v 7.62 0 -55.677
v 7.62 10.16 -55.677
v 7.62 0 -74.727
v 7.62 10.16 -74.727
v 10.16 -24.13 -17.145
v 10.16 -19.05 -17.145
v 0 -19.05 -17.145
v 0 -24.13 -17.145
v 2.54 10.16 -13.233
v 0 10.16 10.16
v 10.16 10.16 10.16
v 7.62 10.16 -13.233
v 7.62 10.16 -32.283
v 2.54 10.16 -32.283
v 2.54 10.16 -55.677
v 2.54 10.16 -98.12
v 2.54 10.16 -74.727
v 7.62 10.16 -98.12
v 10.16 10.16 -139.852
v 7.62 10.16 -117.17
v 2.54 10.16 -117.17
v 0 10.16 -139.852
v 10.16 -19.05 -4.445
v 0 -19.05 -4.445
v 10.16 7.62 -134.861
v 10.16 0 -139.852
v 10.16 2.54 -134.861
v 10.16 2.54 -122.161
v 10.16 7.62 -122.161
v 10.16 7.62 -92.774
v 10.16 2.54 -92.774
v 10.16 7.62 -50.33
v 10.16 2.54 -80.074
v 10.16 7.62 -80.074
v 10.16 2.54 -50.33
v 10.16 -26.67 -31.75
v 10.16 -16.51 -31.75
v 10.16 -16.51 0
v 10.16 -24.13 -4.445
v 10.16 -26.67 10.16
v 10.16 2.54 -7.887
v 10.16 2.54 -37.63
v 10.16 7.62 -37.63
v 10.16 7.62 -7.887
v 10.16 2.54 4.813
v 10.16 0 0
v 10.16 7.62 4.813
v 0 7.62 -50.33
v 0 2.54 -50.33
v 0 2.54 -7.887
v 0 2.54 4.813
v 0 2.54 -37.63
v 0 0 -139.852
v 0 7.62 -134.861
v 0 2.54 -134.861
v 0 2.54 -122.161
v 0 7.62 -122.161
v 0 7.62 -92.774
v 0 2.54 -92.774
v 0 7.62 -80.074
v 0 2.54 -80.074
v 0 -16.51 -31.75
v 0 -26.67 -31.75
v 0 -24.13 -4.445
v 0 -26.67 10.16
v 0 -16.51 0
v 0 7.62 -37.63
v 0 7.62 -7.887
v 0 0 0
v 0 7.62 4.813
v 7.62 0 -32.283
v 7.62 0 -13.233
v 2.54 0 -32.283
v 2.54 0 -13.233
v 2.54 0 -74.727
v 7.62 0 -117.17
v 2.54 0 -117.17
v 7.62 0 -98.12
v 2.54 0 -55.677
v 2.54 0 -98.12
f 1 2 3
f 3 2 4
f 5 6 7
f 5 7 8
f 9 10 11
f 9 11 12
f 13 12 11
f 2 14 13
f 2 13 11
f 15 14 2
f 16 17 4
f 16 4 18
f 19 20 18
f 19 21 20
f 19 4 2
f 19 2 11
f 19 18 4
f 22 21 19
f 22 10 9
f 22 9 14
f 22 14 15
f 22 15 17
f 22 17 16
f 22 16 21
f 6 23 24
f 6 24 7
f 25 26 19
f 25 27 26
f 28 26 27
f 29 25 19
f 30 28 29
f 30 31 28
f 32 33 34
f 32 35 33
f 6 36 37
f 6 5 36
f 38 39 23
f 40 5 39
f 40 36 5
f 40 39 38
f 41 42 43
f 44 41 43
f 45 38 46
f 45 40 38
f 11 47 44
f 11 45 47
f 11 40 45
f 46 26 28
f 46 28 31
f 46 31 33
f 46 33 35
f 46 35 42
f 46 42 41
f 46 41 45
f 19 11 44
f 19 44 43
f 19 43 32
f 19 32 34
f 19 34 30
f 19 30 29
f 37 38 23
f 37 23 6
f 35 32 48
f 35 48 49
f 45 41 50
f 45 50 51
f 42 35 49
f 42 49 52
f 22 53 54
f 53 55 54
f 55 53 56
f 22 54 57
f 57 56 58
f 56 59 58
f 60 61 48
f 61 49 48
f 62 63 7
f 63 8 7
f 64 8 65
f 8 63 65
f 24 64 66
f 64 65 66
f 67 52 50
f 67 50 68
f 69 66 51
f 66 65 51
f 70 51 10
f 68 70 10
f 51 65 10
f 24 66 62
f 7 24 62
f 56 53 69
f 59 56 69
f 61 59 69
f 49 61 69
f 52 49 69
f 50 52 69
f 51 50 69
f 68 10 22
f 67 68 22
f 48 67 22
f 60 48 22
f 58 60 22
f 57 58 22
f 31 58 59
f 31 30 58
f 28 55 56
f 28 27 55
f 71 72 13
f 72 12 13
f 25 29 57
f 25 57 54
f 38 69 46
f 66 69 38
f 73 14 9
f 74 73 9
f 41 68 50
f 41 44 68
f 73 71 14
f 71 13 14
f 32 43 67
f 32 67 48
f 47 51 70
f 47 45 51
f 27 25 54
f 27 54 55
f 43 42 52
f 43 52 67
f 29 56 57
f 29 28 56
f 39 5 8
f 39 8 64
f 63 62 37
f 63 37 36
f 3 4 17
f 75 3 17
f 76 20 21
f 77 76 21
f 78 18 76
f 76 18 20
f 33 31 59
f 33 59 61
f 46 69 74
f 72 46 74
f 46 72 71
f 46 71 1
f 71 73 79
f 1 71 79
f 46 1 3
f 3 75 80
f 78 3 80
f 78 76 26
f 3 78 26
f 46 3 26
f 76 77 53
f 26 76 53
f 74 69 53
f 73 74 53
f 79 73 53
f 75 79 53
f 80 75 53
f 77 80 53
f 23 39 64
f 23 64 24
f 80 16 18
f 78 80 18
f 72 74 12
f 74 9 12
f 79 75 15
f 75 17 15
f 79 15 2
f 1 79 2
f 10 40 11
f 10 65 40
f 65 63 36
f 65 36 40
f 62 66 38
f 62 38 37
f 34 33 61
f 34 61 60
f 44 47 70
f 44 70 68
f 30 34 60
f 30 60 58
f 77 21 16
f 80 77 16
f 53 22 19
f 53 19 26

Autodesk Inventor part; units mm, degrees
ref_plane "YZ Plane" through (0, 0, 0) normal (1, 0, 0) x (0, 1, 0)
ref_plane "XZ Plane" through (0, 0, 0) normal (0, 1, 0) x (-1, 0, 0)
ref_plane "XY Plane" through (0, 0, 0) normal (0, 0, 1) x (1, 0, 0)
sketch "Sketch1" plane through (0, 0, 0) normal (1, 0, 0) x (0, 1, 0)
  line L0 (0, 0) -> (0, -139.8524)
  line L1 (0, 0) -> (-16.51, 0)
  line L2 (-16.51, 0) -> (-16.51, -31.75)
  line L3 (-16.51, -31.75) -> (-26.67, -31.75)
  line L4 (-26.67, -31.75) -> (-26.67, 10.16)
  line L5 (-26.67, 10.16) -> (10.16, 10.16)
  line L6 (10.16, 10.16) -> (10.16, -139.8524)
  line L7 (10.16, -139.8524) -> (0, -139.8524)
  dimension "d1" = 10.16
  dimension "d2" = 10.16
  dimension "d3" = 16.51
  dimension "d4" = 31.75
  dimension "d5" = 10.16
  dimension "d17" = 150.0124
extrude "Extrusion1" add sketch "Sketch1" along normal blind 10.16
sketch "Sketch2" plane through (0, 10.16, 10.16) normal (0, 1, 0) x (1, 0, 0)
  line L0 (2.54, 23.3934) -> (7.62, 23.3934)
  line L1 (7.62, 23.3934) -> (7.62, 42.4434)
  line L2 (7.62, 42.4434) -> (2.54, 42.4434)
  line L3 (2.54, 42.4434) -> (2.54, 23.3934)
  line L4 (0, 0) -> (10.16, 0) projected
  line L5 (0, 150.0124) -> (0, 0) projected
  line L6 (10.16, 150.0124) -> (10.16, 0) projected
  line L7 (2.54, 65.8368) -> (7.62, 65.8368)
  line L8 (7.62, 65.8368) -> (7.62, 84.8868)
  line L9 (7.62, 84.8868) -> (2.54, 84.8868)
  line L10 (2.54, 84.8868) -> (2.54, 65.8368)
  line L11 (2.54, 108.2802) -> (7.62, 108.2802)
  line L12 (7.62, 108.2802) -> (7.62, 127.3302)
  line L13 (7.62, 127.3302) -> (2.54, 127.3302)
  line L14 (2.54, 127.3302) -> (2.54, 108.2802)
  line L15 (0, 150.0124) -> (10.16, 150.0124) projected
  point P0 (0, 10.16)
  dimension "d8" = 23.3934
  dimension "d9" = 19.05
  dimension "d10" = 5.08
  dimension "d11" = 2.54
  dimension "d12" = 2.54
  dimension "d13" = 19.05
  dimension "d14" = 23.3934
  dimension "d15" = 19.05
  dimension "d16" = 23.3934
  dimension "d18" = 22.6822
  dimension "d19" = 5.08
  dimension "d20" = 5.08
  dimension "d21" = 2.54
  dimension "d22" = 2.54
  dimension "d23" = 2.54
  dimension "d24" = 2.54
extrude "Extrusion2" cut sketch "Sketch2" against normal blind 10.16 contours L3 L2 L1 L0 | L10 L9 L8 L7 | L14 L13 L12 L11
sketch "Sketch3" plane through (10.16, 0, 0) normal (1, 0, 0) x (0, 0, -1)
  line L0 (17.145, -24.13) -> (4.445, -24.13)
  line L1 (4.445, -24.13) -> (4.445, -19.05)
  line L2 (4.445, -19.05) -> (17.145, -19.05)
  line L3 (17.145, -19.05) -> (17.145, -24.13)
  line L4 (31.75, -16.51) -> (0, -16.51) projected
  line L5 (-10.16, -26.67) -> (31.75, -26.67) projected
  line L6 (-10.16, 10.16) -> (-10.16, -26.67) projected
  line L7 (31.75, -26.67) -> (31.75, -16.51) projected
  line L8 (-4.8133, 7.62) -> (7.8867, 7.62)
  line L9 (7.8867, 7.62) -> (7.8867, 2.54)
  line L10 (7.8867, 2.54) -> (-4.8133, 2.54)
  line L11 (-4.8133, 2.54) -> (-4.8133, 7.62)
  line L12 (139.8524, 10.16) -> (-10.16, 10.16) projected
  line L13 (0, 0) -> (139.8524, 0) projected
  line L14 (134.8613, 2.54) -> (122.1613, 2.54)
  line L15 (122.1613, 2.54) -> (122.1613, 7.62)
  line L16 (122.1613, 7.62) -> (134.8613, 7.62)
  line L17 (134.8613, 7.62) -> (134.8613, 2.54)
  line L18 (139.8524, 0) -> (139.8524, 10.16) projected
  line L19 (80.0735, 7.62) -> (92.7735, 7.62)
  line L20 (92.7735, 7.62) -> (92.7735, 2.54)
  line L21 (92.7735, 2.54) -> (80.0735, 2.54)
  line L22 (80.0735, 2.54) -> (80.0735, 7.62)
  line L23 (37.6301, 7.62) -> (50.3301, 7.62)
  line L24 (50.3301, 7.62) -> (50.3301, 2.54)
  line L25 (50.3301, 2.54) -> (37.6301, 2.54)
  line L26 (37.6301, 2.54) -> (37.6301, 7.62)
  point P0 (13.2334, 10.16)
  point P1 (117.1702, 10.16)
  point P2 (55.6768, 10.16)
  point P3 (32.2834, 10.16)
  point P4 (74.7268, 10.16)
  point P5 (98.1202, 10.16)
  dimension "d27" = 12.7
  dimension "d28" = 2.54
  dimension "d29" = 5.08
  dimension "d30" = 2.54
  dimension "d31" = 14.605
  dimension "d32" = 14.605
  dimension "d33" = 5.3467
  dimension "d34" = 12.7
  dimension "d35" = 5.3467
  dimension "d36" = 5.08
  dimension "d37" = 2.54
  dimension "d38" = 2.54
  dimension "d39" = 5.08
  dimension "d40" = 4.9911
  dimension "d41" = 12.7
  dimension "d42" = 4.9911
  dimension "d43" = 2.54
  dimension "d44" = 2.54
  dimension "d45" = 12.7
  dimension "d46" = 5.3467
  dimension "d47" = 5.3467
  dimension "d48" = 12.7
  dimension "d49" = 5.3467
  dimension "d50" = 5.3467
extrude "Extrusion3" cut sketch "Sketch3" against normal through all
equation "\"d2\" = d1"
equation "\"d11\" = d12"
equation "\"d13\" = d9"
equation "\"d14\" = d8"
equation "\"d15\" = d13"
equation "\"d16\" = d14"
equation "\"d28\" = d30"
equation "\"d31\" = d32"
equation "\"d33\" = d35"
equation "\"d37\" = d38"
equation "\"d40\" = d42"
equation "\"d43\" = d44"
equation "\"d46\" = d47"
equation "\"d49\" = d50"
properties part number "spool holder" material "PLA"
